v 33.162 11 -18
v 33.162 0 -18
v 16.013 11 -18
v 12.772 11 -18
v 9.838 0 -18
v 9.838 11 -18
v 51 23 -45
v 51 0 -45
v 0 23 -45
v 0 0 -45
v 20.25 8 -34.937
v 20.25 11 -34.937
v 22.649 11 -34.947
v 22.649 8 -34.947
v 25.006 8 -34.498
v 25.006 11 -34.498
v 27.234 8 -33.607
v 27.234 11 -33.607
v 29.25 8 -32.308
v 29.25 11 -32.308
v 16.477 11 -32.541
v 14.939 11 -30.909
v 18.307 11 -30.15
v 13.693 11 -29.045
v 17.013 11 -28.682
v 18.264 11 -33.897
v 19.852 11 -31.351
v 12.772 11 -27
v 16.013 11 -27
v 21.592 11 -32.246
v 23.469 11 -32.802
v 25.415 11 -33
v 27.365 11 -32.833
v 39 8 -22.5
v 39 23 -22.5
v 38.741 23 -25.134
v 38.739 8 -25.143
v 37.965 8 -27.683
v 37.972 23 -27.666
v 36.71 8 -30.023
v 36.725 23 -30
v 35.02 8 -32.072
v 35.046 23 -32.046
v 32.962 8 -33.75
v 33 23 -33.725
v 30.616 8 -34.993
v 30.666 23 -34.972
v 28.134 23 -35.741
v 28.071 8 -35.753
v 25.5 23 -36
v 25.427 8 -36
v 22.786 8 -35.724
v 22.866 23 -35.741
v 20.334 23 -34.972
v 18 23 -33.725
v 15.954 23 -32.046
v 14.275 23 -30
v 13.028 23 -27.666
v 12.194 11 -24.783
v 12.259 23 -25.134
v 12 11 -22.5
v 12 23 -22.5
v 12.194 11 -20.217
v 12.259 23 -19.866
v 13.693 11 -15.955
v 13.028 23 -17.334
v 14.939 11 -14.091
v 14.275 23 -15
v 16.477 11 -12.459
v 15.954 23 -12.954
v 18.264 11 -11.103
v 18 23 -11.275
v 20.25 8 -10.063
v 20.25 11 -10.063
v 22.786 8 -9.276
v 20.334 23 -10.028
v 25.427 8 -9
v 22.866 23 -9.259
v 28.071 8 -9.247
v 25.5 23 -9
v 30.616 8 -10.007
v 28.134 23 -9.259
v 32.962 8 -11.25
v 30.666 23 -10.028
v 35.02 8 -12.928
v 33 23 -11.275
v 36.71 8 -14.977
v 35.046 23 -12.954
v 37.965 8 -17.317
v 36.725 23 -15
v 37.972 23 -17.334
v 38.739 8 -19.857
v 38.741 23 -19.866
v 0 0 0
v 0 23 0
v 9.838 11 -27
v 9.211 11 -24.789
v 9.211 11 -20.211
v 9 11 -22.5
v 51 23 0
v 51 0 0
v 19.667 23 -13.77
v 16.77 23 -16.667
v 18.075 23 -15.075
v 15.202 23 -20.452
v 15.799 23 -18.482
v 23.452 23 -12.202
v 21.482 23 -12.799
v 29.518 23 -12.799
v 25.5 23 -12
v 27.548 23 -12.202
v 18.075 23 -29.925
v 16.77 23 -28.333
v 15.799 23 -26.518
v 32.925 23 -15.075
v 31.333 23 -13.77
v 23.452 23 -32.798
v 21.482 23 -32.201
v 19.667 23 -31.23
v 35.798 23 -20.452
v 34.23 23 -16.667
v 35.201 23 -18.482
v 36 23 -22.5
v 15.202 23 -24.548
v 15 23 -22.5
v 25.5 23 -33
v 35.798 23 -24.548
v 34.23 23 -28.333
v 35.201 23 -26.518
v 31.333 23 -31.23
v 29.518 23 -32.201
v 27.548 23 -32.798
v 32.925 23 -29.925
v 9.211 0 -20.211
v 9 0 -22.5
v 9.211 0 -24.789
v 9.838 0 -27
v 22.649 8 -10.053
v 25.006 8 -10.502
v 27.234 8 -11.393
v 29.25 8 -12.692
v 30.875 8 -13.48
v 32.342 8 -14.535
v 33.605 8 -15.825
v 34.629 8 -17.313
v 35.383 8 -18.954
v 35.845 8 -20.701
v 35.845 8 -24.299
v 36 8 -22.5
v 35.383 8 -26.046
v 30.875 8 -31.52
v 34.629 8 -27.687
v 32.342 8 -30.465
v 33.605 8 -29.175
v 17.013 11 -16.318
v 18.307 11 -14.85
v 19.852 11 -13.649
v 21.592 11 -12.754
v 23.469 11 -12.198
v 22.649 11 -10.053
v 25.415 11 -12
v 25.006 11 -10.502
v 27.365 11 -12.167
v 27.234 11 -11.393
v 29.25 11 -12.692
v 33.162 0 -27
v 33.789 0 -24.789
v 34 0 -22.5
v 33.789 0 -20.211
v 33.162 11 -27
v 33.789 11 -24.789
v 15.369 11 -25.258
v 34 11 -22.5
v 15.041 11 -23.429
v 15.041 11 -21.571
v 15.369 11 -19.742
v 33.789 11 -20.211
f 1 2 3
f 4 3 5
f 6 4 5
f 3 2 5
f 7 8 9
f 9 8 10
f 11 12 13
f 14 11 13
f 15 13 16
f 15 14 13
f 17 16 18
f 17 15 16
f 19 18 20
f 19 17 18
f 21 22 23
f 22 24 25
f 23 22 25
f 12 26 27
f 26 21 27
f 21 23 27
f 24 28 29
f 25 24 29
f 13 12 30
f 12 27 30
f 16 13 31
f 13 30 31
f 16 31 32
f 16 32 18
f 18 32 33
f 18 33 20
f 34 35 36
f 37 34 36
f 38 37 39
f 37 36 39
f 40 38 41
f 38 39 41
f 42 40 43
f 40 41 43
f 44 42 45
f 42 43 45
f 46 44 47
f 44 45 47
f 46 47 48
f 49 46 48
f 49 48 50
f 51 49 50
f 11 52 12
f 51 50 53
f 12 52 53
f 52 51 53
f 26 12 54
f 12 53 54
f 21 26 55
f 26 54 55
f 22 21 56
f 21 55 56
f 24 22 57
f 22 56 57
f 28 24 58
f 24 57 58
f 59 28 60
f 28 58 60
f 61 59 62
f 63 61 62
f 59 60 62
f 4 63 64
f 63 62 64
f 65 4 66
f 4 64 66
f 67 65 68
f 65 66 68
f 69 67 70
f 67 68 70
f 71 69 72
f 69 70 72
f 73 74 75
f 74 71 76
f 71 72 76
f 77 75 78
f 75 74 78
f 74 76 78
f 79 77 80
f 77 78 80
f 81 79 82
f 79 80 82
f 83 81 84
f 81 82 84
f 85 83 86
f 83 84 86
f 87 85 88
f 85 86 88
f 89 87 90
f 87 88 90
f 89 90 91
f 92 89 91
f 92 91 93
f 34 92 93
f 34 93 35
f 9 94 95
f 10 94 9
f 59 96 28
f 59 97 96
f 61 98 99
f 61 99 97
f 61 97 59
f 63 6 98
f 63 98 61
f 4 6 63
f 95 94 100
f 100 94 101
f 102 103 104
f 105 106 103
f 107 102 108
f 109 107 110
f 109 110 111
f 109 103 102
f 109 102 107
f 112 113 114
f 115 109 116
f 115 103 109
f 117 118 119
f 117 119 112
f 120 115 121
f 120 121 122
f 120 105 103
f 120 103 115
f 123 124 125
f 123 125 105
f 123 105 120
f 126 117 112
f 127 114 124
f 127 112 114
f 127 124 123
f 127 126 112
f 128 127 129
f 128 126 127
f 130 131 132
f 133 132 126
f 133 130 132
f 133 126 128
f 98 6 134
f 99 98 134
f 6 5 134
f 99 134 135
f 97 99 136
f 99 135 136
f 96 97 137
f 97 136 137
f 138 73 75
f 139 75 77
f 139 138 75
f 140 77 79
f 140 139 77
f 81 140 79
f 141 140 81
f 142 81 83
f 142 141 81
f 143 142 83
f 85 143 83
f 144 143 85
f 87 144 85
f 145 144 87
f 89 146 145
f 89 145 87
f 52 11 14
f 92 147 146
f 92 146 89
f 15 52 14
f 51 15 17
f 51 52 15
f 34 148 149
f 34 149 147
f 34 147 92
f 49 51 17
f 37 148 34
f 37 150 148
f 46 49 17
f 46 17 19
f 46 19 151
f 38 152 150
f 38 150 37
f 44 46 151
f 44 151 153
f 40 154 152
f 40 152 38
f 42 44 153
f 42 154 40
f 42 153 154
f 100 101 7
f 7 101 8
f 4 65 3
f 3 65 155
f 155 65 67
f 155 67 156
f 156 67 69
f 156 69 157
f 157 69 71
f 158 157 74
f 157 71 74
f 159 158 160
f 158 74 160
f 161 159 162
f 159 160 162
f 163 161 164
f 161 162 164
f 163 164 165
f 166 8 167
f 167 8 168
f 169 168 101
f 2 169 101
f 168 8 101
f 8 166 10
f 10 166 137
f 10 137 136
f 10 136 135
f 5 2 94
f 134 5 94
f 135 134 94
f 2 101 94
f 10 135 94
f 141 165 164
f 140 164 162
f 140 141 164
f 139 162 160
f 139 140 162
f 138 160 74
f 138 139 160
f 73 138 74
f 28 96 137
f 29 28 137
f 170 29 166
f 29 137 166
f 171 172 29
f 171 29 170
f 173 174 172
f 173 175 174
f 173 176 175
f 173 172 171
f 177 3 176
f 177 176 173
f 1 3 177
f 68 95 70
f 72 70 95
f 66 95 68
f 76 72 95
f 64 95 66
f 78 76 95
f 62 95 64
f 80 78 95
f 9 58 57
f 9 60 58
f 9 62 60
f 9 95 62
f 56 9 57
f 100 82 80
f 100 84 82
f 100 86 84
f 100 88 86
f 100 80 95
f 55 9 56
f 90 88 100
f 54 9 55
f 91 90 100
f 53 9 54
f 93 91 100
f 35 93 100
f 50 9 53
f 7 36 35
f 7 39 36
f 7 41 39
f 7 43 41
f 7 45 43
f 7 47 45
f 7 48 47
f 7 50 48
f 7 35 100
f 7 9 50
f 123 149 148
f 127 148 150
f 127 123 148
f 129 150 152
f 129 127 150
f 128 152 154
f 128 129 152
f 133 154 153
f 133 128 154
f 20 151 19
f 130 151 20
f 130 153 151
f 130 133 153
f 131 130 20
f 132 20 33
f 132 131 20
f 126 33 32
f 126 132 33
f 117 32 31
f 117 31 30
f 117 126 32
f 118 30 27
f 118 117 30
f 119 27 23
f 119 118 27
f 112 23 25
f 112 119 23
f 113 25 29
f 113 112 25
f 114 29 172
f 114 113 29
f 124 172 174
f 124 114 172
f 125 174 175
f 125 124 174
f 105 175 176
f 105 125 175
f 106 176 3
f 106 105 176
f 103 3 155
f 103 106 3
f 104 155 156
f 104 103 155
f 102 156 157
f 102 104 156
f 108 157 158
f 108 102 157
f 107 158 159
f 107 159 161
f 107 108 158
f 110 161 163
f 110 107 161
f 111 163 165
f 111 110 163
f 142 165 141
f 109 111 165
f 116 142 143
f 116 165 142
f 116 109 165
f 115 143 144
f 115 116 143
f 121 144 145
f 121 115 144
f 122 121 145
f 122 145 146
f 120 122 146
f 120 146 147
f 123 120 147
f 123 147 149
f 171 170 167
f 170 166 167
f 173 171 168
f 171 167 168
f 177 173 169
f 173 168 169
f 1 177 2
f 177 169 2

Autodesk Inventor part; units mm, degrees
ref_plane "YZ Plane" through (0, 0, 0) normal (1, 0, 0) x (0, 1, 0)
ref_plane "XZ Plane" through (0, 0, 0) normal (0, 1, 0) x (-1, 0, 0)
ref_plane "XY Plane" through (0, 0, 0) normal (0, 0, 1) x (1, 0, 0)
sketch "Sketch1" plane through (0, 0, 0) normal (0, 1, 0) x (-1, 0, 0)
  point P0 (0, 0)
sketch "Sketch2" plane through (0, 0, 0) normal (0, 1, 0) x (-1, 0, 0)
  line L0 (0, 0) -> (-51, 0)
  line L1 (-51, 0) -> (-51, -45)
  line L2 (-51, -45) -> (0, -45)
  line L3 (0, 0) -> (0, -45)
  line L4 (0, -45) -> (0, -22.5)
  circle A0 centre (-21.5, -22.5) radius 12.5
  dimension "d0" = 51
  dimension "d1" = 45
  dimension "d6" = 25
extrude "Extrusion1" add sketch "Sketch2" along normal blind 11
sketch "Sketch3" plane through (0, 11, 0) normal (0, 1, 0) x (1, 0, 0)
  line L0 (0, 45) -> (0, 0) projected
  line L1 (51, 0) -> (51, 45) projected
  line L2 (0, 0) -> (51, 0)
  line L3 (51, 0) -> (51, 45)
  line L4 (51, 45) -> (0, 45)
  line L5 (0, 45) -> (0, 0)
extrude "Extrusion2" add sketch "Sketch3" along normal blind 12
sketch "Sketch4" plane through (0, 23, 0) normal (0, 1, 0) x (1, 0, 0)
  line L0 (0, 45) -> (0, 0) projected
  line L1 (0, 0) -> (51, 0) projected
  line L2 (3, 14) -> (3, 31)
  line L3 (3, 22.5) -> (3, 20.3)
  line L4 (3, 20.3) -> (3, 24.7)
  line L5 (17.5, 19.5) -> (3, 20.3)
  line L6 (3, 24.7) -> (17.5, 25.5)
  line L7 (17.5, 25.5) -> (17.5, 31.5)
  line L8 (17.5, 31.5) -> (21.5, 31.5)
  line L9 (21.5, 31.5) -> (21.5, 26.5)
  line L10 (17.5, 19.5) -> (17.5, 13.5)
  line L11 (17.5, 13.5) -> (21.5, 13.5)
  line L12 (21.5, 13.5) -> (21.5, 18.5)
  line L13 (38.5, 22.5) -> (38.5, 20.3)
  line L14 (38.5, 20.3) -> (38.5, 24.7)
  line L15 (38.5, 24.7) -> (21.5, 26.5)
  line L16 (38.5, 20.3) -> (21.5, 18.5)
  dimension "d13" = 17
  dimension "d14" = 2.2
  dimension "d15" = 4.4
  dimension "d18" = 6
  dimension "d19" = 6
  dimension "d20" = 4
  dimension "d21" = 5
  dimension "d23" = 6
  dimension "d24" = 4
  dimension "d25" = 5
  dimension "d26" = 2.2
  dimension "d27" = 4.4
extrude "Extrusion3" cut sketch "Sketch4" against normal blind 4
extrude "Extrusion4" add sketch "Sketch4" against normal blind 4
sketch "Sketch5" plane through (0, 23, 0) normal (0, 1, 0) x (1, 0, 0)
  line L0 (0, 0) -> (51, 0) projected
  circle A0 centre (25.5, 22.5) radius 13.5
  circle A1 centre (25.5, 22.5) radius 10.5
  dimension "d32" = 27
  dimension "d33" = 21
extrude "Extrusion5" cut sketch "Sketch5" against normal blind 15
sketch "Sketch6" plane through (0, 0, 0) normal (0, -1, 0) x (1, 0, 0)
  arc A0 (20.25, -34.9373) -> (29.25, -32.3075) centre (21.5, -22.5) ccw projected
  circle A1 centre (21.5, -22.5) radius 12.5
  point P0 (0, 0)
extrude "Extrusion6" add sketch "Sketch6" against normal blind 11
sketch "Sketch7" plane through (0, 0, 0) normal (0, -1, 0) x (1, 0, 0)
  line L0 (21.5, -27) -> (34, -27)
  line L1 (34, -27) -> (34, -22.5)
  line L2 (34, -22.5) -> (34, -18)
  line L3 (34, -18) -> (9, -18)
  line L4 (9, -18) -> (9, -27)
  line L5 (9, -27) -> (21.5, -27)
  circle A0 centre (21.5, -22.5) radius 12.5
  point P0 (0, 0)
  point P1 (33.1619, -18)
  point P2 (9.8381, -18)
  point P3 (9.8381, -27)
  point P4 (33.1619, -27)
  dimension "d44" = 12.5
  dimension "d45" = 4.5
  dimension "d46" = 25
  dimension "d47" = 9
  dimension "d48" = 25
extrude "Extrusion7" cut sketch "Sketch7" against normal blind 11 contours L5 A0 L3 L0
properties part number "CameraOverhead"
